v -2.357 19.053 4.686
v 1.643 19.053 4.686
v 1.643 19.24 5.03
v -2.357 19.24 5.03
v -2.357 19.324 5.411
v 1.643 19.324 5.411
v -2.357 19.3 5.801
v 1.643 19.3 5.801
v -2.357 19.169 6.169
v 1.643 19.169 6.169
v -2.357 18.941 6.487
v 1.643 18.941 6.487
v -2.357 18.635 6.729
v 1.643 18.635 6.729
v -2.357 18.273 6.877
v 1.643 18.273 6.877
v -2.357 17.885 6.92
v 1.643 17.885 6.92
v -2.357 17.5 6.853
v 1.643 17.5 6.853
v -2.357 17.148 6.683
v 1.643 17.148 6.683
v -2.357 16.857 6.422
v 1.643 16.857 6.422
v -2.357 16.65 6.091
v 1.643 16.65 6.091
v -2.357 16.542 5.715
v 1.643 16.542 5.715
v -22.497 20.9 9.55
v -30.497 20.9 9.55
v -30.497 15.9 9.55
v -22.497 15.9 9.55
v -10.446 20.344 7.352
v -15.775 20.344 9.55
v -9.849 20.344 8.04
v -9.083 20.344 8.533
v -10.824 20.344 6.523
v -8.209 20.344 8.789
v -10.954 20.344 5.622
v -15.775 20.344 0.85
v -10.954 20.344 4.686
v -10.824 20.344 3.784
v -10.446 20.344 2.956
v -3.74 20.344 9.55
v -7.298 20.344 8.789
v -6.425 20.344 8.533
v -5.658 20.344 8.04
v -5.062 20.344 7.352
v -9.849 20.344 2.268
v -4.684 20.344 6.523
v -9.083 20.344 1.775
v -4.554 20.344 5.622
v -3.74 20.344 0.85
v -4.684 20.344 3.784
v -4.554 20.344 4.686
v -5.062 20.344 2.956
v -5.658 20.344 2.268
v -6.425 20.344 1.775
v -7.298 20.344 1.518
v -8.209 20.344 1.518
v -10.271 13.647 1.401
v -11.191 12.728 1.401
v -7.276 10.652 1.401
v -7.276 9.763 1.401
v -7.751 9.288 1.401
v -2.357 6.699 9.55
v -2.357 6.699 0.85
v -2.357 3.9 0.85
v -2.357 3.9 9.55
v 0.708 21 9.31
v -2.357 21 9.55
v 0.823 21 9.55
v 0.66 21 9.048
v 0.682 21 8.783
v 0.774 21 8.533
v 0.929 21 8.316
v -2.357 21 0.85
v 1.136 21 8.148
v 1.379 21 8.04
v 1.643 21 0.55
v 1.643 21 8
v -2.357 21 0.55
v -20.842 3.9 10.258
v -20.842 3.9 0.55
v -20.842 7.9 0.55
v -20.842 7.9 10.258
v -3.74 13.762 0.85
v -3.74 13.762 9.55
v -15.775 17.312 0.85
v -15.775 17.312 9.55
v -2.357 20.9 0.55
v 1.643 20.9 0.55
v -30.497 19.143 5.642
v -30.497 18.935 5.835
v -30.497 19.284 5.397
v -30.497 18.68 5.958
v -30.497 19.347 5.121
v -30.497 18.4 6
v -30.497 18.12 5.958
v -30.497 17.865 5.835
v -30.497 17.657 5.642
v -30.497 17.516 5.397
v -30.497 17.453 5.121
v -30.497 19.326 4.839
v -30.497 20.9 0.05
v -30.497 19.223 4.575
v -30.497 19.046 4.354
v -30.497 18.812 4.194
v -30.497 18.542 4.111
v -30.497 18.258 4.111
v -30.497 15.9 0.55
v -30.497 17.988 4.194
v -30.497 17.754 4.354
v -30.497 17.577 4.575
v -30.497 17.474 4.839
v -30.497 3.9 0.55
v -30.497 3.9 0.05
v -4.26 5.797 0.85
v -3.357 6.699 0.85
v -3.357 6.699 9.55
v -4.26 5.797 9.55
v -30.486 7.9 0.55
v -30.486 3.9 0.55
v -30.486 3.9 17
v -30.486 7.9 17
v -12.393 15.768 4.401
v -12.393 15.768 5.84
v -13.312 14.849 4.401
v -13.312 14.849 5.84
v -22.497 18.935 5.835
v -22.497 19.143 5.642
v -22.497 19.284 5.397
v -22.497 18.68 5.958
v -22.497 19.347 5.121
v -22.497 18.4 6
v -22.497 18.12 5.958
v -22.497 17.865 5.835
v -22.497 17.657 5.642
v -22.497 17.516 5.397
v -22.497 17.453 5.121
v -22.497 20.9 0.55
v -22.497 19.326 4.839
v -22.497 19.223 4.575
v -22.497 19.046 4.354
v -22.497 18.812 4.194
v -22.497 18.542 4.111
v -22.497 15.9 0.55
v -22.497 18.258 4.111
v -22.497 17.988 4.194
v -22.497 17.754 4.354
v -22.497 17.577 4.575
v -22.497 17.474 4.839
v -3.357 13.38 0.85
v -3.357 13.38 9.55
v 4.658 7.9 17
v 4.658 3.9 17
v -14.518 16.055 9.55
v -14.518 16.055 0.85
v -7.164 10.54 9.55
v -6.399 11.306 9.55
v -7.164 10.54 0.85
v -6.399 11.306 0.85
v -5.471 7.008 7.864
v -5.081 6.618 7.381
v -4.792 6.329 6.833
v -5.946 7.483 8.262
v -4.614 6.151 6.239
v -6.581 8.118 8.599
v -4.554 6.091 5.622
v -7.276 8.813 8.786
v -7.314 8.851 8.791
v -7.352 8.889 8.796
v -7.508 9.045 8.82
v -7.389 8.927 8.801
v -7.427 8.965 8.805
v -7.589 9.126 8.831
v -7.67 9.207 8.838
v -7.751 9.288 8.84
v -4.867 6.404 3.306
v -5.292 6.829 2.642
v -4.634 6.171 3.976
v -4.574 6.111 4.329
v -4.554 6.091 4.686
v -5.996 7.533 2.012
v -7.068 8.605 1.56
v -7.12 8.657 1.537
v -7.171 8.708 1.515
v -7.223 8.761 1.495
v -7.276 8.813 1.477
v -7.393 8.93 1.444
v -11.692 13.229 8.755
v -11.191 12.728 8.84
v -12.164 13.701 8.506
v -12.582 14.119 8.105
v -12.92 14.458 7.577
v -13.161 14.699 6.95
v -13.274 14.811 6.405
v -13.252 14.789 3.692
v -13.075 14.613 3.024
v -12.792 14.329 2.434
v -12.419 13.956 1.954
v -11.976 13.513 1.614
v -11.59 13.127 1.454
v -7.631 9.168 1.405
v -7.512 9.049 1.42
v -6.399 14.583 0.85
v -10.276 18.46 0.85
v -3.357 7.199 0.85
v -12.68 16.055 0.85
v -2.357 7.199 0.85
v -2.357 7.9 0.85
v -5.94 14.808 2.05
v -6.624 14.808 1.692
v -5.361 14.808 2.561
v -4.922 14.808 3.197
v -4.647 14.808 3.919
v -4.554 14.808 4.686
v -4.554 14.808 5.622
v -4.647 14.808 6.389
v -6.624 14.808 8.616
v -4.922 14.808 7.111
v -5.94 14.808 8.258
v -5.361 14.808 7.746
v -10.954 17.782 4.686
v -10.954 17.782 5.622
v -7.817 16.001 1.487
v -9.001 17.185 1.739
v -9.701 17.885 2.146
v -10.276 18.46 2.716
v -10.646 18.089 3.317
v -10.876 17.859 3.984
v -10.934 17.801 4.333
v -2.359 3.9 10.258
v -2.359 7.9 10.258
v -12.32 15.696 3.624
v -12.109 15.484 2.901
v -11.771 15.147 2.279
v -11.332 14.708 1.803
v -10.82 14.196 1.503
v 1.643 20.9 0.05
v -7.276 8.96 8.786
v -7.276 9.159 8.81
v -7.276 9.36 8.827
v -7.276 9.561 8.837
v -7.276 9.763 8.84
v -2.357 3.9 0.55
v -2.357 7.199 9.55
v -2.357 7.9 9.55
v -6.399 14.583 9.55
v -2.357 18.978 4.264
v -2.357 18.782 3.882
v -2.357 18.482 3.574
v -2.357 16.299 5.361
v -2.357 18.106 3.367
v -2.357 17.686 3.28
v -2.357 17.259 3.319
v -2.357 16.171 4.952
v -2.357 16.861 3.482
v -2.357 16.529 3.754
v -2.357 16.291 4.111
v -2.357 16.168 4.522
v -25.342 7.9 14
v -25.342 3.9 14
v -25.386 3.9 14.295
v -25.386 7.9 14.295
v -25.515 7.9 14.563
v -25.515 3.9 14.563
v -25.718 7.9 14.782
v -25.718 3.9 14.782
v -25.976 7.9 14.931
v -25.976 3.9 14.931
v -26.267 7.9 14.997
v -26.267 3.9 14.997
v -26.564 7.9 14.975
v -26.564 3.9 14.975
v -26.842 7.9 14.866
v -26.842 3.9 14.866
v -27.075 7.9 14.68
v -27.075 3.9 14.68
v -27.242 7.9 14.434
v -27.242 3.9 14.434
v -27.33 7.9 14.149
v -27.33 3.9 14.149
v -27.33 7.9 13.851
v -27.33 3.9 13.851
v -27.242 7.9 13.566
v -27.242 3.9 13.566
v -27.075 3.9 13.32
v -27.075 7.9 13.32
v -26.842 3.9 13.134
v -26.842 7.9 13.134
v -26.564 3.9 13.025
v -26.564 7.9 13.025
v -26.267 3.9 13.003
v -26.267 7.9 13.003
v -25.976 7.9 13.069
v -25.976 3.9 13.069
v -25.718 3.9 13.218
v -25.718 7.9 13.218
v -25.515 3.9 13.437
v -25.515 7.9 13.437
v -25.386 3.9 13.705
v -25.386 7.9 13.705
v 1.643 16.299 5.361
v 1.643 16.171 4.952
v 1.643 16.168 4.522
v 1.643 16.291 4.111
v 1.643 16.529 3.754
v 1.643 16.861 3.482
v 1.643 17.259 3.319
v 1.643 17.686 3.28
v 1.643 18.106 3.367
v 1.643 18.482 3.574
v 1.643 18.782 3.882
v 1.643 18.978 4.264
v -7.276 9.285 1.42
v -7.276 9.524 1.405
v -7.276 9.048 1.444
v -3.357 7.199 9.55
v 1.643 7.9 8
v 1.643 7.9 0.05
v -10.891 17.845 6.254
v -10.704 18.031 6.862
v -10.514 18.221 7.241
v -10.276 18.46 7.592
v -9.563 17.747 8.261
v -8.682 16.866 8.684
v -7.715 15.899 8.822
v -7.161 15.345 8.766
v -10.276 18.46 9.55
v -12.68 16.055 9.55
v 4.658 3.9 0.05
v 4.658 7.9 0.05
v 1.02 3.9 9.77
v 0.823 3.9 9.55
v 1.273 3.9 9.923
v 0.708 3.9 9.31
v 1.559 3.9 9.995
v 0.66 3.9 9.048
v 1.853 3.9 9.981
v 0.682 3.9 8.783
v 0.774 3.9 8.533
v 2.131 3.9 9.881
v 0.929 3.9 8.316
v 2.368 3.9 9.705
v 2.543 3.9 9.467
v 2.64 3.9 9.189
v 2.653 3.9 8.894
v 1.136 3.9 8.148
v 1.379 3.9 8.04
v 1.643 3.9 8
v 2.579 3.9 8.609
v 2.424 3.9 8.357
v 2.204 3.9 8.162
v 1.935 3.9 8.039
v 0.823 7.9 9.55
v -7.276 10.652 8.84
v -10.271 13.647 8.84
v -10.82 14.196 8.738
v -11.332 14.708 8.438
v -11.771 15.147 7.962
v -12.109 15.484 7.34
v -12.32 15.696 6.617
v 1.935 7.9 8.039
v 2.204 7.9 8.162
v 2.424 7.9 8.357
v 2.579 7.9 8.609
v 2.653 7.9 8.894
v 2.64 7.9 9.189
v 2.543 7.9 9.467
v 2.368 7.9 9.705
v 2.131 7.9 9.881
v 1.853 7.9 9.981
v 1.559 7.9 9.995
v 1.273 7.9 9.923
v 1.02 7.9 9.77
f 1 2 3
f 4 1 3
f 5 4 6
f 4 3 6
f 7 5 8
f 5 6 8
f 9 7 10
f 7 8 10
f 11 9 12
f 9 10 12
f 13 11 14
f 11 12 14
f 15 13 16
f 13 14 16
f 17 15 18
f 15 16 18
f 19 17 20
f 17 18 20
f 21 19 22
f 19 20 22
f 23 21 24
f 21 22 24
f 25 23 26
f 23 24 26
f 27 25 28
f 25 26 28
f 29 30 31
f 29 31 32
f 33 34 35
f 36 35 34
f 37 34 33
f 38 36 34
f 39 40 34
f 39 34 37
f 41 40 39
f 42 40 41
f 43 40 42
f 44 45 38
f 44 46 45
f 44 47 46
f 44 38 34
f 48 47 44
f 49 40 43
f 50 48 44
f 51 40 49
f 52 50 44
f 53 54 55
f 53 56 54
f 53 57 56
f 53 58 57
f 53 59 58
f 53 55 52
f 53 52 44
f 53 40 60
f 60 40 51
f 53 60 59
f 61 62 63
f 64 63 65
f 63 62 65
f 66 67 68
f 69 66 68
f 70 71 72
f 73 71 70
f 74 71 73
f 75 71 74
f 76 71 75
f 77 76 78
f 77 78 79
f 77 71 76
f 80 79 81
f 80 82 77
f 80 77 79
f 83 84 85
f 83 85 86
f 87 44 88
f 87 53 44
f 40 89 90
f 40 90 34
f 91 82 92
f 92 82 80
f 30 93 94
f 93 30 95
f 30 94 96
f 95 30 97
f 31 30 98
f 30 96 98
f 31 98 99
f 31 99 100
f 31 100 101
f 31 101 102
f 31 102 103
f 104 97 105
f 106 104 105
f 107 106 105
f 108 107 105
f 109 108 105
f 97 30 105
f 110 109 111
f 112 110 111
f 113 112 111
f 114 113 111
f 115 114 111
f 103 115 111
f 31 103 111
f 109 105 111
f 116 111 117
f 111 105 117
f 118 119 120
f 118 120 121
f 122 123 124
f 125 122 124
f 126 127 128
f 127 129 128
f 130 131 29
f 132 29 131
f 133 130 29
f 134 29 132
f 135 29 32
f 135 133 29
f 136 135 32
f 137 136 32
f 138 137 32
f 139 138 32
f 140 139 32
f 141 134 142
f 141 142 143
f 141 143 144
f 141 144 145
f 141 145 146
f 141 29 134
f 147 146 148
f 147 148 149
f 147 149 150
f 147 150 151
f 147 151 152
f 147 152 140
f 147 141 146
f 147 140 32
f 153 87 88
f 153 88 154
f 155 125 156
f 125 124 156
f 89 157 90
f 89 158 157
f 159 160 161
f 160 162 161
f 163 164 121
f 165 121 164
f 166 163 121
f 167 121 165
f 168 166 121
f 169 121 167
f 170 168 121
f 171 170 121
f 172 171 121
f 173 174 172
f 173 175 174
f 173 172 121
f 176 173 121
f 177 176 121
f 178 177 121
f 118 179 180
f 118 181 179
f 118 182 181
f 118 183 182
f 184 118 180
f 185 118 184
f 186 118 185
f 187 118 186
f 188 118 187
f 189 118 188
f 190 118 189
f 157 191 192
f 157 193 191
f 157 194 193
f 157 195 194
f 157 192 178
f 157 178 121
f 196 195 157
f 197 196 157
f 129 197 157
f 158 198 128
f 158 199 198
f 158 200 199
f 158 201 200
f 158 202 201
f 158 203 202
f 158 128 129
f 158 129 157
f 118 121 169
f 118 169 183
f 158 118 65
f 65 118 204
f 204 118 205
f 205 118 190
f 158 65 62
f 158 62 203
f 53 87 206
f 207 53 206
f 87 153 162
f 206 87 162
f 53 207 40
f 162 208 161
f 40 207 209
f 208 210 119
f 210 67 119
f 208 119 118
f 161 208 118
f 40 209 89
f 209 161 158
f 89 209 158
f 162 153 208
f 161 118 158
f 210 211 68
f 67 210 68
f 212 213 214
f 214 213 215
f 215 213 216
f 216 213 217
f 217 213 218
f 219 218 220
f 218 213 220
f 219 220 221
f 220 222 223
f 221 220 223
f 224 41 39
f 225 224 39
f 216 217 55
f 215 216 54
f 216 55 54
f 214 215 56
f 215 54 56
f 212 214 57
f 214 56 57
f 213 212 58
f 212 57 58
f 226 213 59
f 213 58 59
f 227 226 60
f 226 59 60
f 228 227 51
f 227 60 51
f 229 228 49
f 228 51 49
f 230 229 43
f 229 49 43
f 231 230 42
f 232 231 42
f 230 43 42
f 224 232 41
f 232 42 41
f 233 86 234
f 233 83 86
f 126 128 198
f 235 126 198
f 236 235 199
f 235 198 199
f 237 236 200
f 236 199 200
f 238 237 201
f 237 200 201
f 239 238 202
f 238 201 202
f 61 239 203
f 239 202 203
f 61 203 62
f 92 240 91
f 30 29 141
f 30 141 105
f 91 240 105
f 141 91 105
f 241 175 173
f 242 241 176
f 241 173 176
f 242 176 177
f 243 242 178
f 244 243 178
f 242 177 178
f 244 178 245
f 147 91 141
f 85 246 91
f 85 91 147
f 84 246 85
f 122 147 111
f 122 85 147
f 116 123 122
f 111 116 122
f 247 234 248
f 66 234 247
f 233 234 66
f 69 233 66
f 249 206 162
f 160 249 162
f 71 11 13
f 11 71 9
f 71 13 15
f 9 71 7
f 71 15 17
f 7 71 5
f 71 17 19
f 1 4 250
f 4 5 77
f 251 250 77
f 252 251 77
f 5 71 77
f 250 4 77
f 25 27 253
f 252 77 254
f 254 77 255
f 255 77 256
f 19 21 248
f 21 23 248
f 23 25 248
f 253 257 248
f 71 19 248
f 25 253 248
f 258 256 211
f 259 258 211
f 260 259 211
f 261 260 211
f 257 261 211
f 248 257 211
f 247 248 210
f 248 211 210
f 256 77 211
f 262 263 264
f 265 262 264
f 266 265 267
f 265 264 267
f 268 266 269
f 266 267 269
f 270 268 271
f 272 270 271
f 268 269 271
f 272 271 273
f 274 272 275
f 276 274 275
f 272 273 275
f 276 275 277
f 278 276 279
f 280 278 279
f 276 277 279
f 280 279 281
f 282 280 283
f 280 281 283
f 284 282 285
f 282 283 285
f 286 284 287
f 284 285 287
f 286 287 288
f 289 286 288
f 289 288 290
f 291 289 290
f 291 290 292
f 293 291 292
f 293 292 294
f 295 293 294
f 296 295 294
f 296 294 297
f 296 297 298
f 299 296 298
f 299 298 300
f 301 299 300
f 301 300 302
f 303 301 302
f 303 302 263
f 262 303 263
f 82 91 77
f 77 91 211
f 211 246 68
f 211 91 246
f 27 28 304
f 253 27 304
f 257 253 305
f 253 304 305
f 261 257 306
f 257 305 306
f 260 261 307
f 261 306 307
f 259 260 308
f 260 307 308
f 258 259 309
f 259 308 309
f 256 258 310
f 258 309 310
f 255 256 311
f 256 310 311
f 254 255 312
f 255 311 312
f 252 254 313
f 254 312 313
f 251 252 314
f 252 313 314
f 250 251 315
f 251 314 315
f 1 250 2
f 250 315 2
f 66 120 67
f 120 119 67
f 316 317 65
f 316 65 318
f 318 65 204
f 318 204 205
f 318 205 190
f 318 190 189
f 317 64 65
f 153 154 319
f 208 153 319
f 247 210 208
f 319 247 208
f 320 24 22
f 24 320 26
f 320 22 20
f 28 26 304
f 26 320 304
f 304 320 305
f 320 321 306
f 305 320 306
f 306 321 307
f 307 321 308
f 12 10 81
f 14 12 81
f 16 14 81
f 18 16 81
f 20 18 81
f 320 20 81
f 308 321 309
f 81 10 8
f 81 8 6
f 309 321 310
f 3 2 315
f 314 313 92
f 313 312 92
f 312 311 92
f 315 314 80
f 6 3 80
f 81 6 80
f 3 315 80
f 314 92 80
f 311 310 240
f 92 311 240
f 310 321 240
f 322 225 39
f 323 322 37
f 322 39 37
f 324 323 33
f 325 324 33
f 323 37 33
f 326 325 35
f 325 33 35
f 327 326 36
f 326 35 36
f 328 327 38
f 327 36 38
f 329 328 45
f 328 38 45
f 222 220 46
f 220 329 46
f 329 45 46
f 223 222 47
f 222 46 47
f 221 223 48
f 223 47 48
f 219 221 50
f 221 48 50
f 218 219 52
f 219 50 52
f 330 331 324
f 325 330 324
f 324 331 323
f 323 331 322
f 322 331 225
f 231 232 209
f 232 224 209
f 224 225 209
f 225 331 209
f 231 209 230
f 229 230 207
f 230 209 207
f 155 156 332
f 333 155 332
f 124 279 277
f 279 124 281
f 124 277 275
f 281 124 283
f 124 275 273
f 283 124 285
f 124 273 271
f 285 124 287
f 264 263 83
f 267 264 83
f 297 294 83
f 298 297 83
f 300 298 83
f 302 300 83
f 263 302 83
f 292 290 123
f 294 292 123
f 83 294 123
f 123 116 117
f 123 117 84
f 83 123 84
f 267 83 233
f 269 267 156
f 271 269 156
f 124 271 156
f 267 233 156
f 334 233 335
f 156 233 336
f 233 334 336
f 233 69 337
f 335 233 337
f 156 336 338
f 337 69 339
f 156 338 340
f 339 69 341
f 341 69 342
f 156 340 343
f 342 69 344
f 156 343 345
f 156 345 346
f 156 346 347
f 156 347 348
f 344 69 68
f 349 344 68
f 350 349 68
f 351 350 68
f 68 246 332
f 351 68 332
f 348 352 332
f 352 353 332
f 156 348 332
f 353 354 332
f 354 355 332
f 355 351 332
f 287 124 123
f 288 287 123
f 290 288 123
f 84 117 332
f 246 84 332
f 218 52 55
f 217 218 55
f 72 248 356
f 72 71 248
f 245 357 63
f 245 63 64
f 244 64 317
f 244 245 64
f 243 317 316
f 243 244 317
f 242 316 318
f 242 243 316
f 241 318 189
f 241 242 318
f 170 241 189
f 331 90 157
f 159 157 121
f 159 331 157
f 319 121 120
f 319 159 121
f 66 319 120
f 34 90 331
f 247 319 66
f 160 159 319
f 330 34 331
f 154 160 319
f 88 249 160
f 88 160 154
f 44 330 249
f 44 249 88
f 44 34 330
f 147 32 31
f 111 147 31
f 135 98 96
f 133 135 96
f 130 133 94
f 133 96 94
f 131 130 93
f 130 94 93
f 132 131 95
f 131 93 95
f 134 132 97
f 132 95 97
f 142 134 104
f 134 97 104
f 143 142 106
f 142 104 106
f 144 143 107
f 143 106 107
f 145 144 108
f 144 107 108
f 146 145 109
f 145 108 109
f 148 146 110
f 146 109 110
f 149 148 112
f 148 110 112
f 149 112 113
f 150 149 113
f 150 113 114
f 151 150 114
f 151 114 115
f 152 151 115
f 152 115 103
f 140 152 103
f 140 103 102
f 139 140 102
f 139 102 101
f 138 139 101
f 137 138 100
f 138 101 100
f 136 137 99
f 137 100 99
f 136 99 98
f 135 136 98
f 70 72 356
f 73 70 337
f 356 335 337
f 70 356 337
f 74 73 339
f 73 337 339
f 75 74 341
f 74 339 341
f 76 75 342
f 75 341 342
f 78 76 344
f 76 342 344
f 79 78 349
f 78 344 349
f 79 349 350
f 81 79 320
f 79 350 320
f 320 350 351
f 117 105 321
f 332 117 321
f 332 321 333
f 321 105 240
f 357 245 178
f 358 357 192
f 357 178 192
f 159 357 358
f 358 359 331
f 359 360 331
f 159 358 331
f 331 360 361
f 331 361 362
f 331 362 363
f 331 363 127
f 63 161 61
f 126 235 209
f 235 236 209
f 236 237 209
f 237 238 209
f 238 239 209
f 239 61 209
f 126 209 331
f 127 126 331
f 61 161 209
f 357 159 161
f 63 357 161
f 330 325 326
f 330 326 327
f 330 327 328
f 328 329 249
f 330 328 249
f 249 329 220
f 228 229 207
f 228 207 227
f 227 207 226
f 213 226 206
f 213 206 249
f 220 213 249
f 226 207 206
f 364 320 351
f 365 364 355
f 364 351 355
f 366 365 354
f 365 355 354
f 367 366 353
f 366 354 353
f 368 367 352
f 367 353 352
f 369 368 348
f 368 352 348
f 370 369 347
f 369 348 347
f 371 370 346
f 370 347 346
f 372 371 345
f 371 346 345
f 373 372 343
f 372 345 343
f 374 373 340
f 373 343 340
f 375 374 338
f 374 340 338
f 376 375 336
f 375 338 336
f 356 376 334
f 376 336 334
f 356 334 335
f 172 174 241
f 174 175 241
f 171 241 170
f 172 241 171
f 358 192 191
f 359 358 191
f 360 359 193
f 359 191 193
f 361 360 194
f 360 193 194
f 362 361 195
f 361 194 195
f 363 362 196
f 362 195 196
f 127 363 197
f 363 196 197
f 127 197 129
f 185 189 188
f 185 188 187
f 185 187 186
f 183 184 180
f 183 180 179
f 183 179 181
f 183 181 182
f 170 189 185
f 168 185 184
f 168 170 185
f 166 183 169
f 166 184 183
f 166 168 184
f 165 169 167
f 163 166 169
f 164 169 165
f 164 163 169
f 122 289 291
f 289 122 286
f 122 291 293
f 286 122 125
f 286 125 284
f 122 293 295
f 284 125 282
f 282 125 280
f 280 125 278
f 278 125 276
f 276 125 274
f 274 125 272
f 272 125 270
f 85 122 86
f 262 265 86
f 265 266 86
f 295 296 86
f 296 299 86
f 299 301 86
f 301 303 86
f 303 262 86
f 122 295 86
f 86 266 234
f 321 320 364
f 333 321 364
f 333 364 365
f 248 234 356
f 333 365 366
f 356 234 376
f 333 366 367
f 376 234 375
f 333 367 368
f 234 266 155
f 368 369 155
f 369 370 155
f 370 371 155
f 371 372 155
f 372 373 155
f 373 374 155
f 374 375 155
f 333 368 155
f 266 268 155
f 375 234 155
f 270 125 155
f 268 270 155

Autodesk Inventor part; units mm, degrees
ref_plane "YZ Plane" through (0, 0, 0) normal (1, 0, 0) x (0, 1, 0)
ref_plane "XZ Plane" through (0, 0, 0) normal (0, 1, 0) x (-1, 0, 0)
ref_plane "Work Plane1" through (-9.4272, 11.5884, 0.05) normal (0, 0, 1) x (1, 0, 0)
sketch "Sketch1" plane through (-9.4272, 11.5884, 0.05) normal (0, 0, 1) x (1, 0, 0)
  line L0 (-5.9698, 7.5884) -> (-5.9698, -7.5884) projected
  line L1 (-5.9698, -7.5884) -> (5.9698, -7.5884) projected
  line L2 (5.9698, -7.5884) -> (5.9698, 7.5884) projected
  line L3 (5.9698, 7.5884) -> (-5.9698, 7.5884) projected
  line L4 (-6.0698, 7.6884) -> (-6.0698, -7.6884)
  line L5 (-6.0698, -7.6884) -> (6.0698, -7.6884)
  line L6 (6.0698, -7.6884) -> (6.0698, 7.6884)
  line L7 (6.0698, 7.6884) -> (-6.0698, 7.6884)
  line L8 (-6.0698, -7.6884) -> (-21.0698, -7.6884)
  line L9 (-21.0698, -7.6884) -> (-21.0698, 9.3116)
  line L10 (6.0698, -7.6884) -> (11.0698, -7.6884)
  line L11 (11.0698, -7.6884) -> (11.0698, 9.3116)
  line L12 (11.0698, 9.3116) -> (-21.0698, 9.3116)
  point P0 (9.4272, -11.5884)
  dimension "d0" = 0.1
  dimension "d1" = 15
  dimension "d2" = 17
  dimension "d3" = 5
  dimension "d4" = 90
extrude "Extrusion1" add sketch "Sketch1" along normal blind 0.5 contours L3 L2 L1 L0 | L7 L6 L5 L4 | L4 L8 L9 L12 L11 L10 L6 L7
sketch "Sketch3" plane through (-9.4272, 11.5884, 0.55) normal (0, 0, 1) x (1, 0, 0)
  line L0 (-2.9698, 4.4671) -> (-0.8485, 6.5884) projected
  line L1 (2.2627, -0.7655) -> (-2.9698, 4.4671) projected
  line L2 (2.8284, -0.1998) -> (2.2627, -0.7655) projected
  line L3 (2.8284, 2.9115) -> (2.8284, -0.1998) projected
  line L4 (-0.8485, 6.5884) -> (2.8284, 2.9115) projected
  line L5 (5.6875, 2.1737) -> (6.0698, 1.7914)
  line L6 (6.0698, 1.7914) -> (6.0698, -4.8892)
  line L7 (6.0698, 7.6884) -> (6.0698, -7.5884) projected
  line L8 (6.0698, -4.8892) -> (5.1675, -5.7915)
  line L9 (5.1675, -5.7915) -> (-5.0912, 4.4671)
  line L10 (3.0284, 2.9943) -> (3.0284, -0.2826)
  line L11 (3.0284, -0.2826) -> (2.2627, -1.0483)
  line L12 (2.2627, -1.0483) -> (-3.2527, 4.4671)
  line L13 (-3.2527, 4.4671) -> (-0.8485, 6.8713)
  line L14 (-0.8485, 6.8713) -> (3.0284, 2.9943)
  line L15 (6.0698, -4.8892) -> (7.0698, -4.8892)
  line L16 (7.0698, -4.8892) -> (7.0698, -4.3892)
  line L17 (7.0698, -4.3892) -> (6.0698, -4.3892)
  line L18 (6.0698, -4.3892) -> (6.0698, -4.8892)
  line L19 (-11.0698, 9.4116) -> (11.0698, 9.4116) projected
  line L20 (-21.0698, -7.6884) -> (11.0698, -7.6884) projected
  line L21 (11.0698, 9.4116) -> (7.0698, 9.4116)
  line L22 (7.0698, 9.4116) -> (7.0698, -7.6884)
  line L23 (7.0698, -7.6884) -> (11.0698, -7.6884)
  line L24 (11.0698, -7.6884) -> (11.0698, 9.4116)
  line L25 (-5.0912, 4.4671) -> (-6.3481, 5.724)
  line L26 (-6.3481, 8.7553) -> (-0.8485, 8.7553)
  line L27 (-0.8485, 8.7553) -> (5.6875, 8.7553)
  line L28 (5.6875, 8.7553) -> (5.6875, 2.1737)
  line L29 (-5.0912, 4.4671) -> (-4.0305, 5.5278)
  line L30 (-1.9092, 7.6491) -> (-1.7678, 7.7905)
  line L31 (-6.3481, 5.724) -> (-6.3481, 5.724)
  line L32 (-6.3481, 5.724) -> (-6.3481, 8.7553)
  point P0 (9.4272, -11.5884)
  point P1 (11.0698, -7.6884)
  dimension "d10" = 1.5
  dimension "d11" = 1.5
  dimension "d14" = 0.2
  dimension "d15" = 1
  dimension "d16" = 0.5
extrude "Extrusion3" add sketch "Sketch3" along normal blind 9 contours L5 L6 L8 L9 L25 L32 L26 L27 L28 | L17 L16 L15 L6 | L22 L19 L24 L20 L16
sketch "Sketch4" plane through (-30.497, 3.9, 0.55) normal (0, -1, 0) x (1, 0, 0)
  line L0 (26.2373, 0) -> (14.7218, 0) projected
  line L1 (26.2373, 0) -> (26.2373, 9) projected
  line L2 (14.7218, 9) -> (26.2373, 9) projected
  line L3 (28.1397, 0) -> (0, 0) projected
  line L4 (0, 0) -> (28.1397, 0)
  line L5 (28.1397, 0) -> (28.1397, 0.3)
  line L6 (28.1397, 0.3) -> (0, 0.3)
  line L7 (0, 0.3) -> (0, 0)
  line L8 (14.7218, 0) -> (14.7218, 9) projected
  point P0 (30.497, -0.55)
  point P1 (1.736, 0)
  point P2 (18.1397, 0)
  dimension "d41" = 0.3
extrude "Extrusion4" cut sketch "Sketch4" against normal through all contours L0 L8 L6 L1 | L1 L6 L5 L3 | L3 L7 L6 L8
ref_plane "Work Plane3" through (1.6427, 4, -2.95) normal (1, 0, 0) x (0, 0, -1)
sketch "Sketch5" plane through (1.6427, 4, -2.95) normal (1, 0, 0) x (0, 0, -1)
  line L0 (-3, 16.9) -> (-3.5, 16.9) projected
  line L1 (-12.5, -0.1) -> (-12.5, 17) projected
  line L2 (-3, -0.1) -> (-12.5, -0.1) projected
  circle A0 centre (-8.4703, 13.9285) radius 1.4
  line L3 (-3, 16.9) -> (-3, -0.1) projected
  line L4 (-3.5, 17) -> (-3.5, 16.9) projected
  line L5 (-3.5, 17) -> (-12.5, 17) projected
  point P0 (-2.95, -4)
  dimension "d21" = 2.8
extrude "Extrusion5" cut sketch "Sketch5" against normal up to surface (5.3823 mm away) contours A0
sketch "Sketch6" plane through (-15.7753, 20.3438, 9.55) normal (0, 1, 0) x (1, 0, 0)
  circle A0 centre (8.0214, 3.9282) radius 3.2
  line L0 (8.0214, 3.9282) -> (8.0214, 4.8641) construction
  line L1 (11.2214, 3.9282) -> (11.2214, 4.8641)
  line L2 (4.8214, 4.8641) -> (4.8214, 3.9282)
  arc A1 (4.8214, 3.9282) -> (11.2214, 3.9282) centre (8.0214, 3.9282) ccw
  arc A2 (11.2214, 4.8641) -> (4.8214, 4.8641) centre (8.0214, 4.8641) ccw
  point P0 (15.7753, 9.55)
  point P1 (8.0214, 4.3961)
extrude "Extrusion6" cut sketch "Sketch6" against normal through all
sketch "Sketch7" plane through (-30.497, 3.9, 0.55) normal (-1, 0, 0) x (0, 0, 1)
  circle A0 centre (4.4299, 8.2054) radius 3.6733
  point P0 (-0.55, -3.9)
  point P1 (5.45, 8.2054)
ref_plane "Work Plane2" through (-9.7807, 13.4392, 0.05) normal (-0.7071, -0.7071, 0) x (0, 0, 1)
sketch "Sketch8" plane through (-4.2597, 5.7969, 9.55) normal (-0.7071, -0.7071, 0) x (-0.7071, 0.7071, 0)
  line L0 (16.2855, 8.7) -> (0, 8.7) projected
  line L1 (0, 8.7) -> (0, 0) projected
  line L2 (16.2855, 0) -> (0, 0) projected
  ellipse E0 centre (4.9415, 3.9282) end of major axis (9.4669, 3.9282) minor radius 3.2 (0.416, 3.9282) -> (9.4669, 3.9282) ccw projected
  ellipse E1 centre (4.9415, 4.8641) end of major axis (0.416, 4.8641) minor radius 3.2 (9.4669, 4.8641) -> (0.416, 4.8641) ccw projected
  line L3 (4.9374, 0.7098) -> (9.8018, 0.7098)
  line L4 (12.8018, 3.7098) -> (12.8018, 5.1494)
  line L5 (9.8018, 8.1494) -> (4.9374, 8.1494)
  line L6 (1.9374, 5.1494) -> (1.9374, 3.7098)
  arc A0 (9.8018, 0.7098) -> (12.8018, 3.7098) centre (9.8018, 3.7098) ccw
  arc A1 (12.8018, 5.1494) -> (9.8018, 8.1494) centre (9.8018, 5.1494) ccw
  arc A2 (4.9374, 8.1494) -> (1.9374, 5.1494) centre (4.9374, 5.1494) ccw
  arc A3 (1.9374, 3.7098) -> (4.9374, 0.7098) centre (4.9374, 3.7098) ccw
  line L7 (9.4669, 4.8641) -> (9.4669, 3.9282) projected
  line L8 (16.2855, 8.7) -> (16.2855, 0) projected
  line L9 (0.416, 3.9282) -> (0.416, 4.8641) projected
  point P0 (-7.1111, 9.55)
  dimension "d42" = 3
extrude "Extrusion8" cut sketch "Sketch8" against normal up to surface (1.3 mm away) contours A3 L6 A2 E1 L7 E0 | E0 L7 E1 A2 L5 A1 L4 A0 L3 A3
ref_plane "Work Plane4" through (-9.4272, 11.5884, -2.95) normal (0, 0, -1) x (-1, 0, 0)
ref_plane "Work Plane7" through (-6.3987, 11.3058, 7.8996) normal (0, 1, 0) x (1, 0, 0)
ref_plane "Work Plane5" through (-3.3573, 3.9, 0.05) normal (0, -1, 0) x (1, 0, 0)
sketch "Sketch16" plane through (-3.3573, 3.9, 0.05) normal (0, -1, 0) x (1, 0, 0)
  line L0 (1, 0.5) -> (1, 9.5) projected
  line L1 (-27.1397, 0.5) -> (1, 0.5) projected
  line L2 (5, 0) -> (-27.1397, 0) projected
  line L3 (5, 0) -> (5, 9.5) projected
  line L4 (1, 9.5) -> (5, 9.5) projected
  line L5 (5, 0) -> (-27.1397, 0) projected
  line L6 (-12.1397, 0.5) -> (0, 0.5) projected
  line L7 (5, 0) -> (-27.1397, 0) projected
  line L8 (-27.1397, 0.5) -> (1, 0.5) projected
  line L9 (-27.1397, 0) -> (-27.1397, 0.5) projected
  line L10 (-12.1397, 0) -> (-12.1397, 0.5) projected
  circle A0 centre (5.0158, 8.95) radius 1 projected
  circle A1 centre (-16.4842, -6.55) radius 1 projected
  circle A2 centre (-22.9842, 13.95) radius 1 projected
  line L11 (-27.1287, 16.95) -> (8.0158, 16.95)
  line L12 (8.0158, 16.95) -> (8.0158, 0)
  line L13 (8.0158, 0) -> (-27.1287, 0)
  line L14 (-27.1287, 0) -> (-27.1287, 16.95)
  circle A3 centre (-22.9842, 13.95) radius 1
  circle A4 centre (5.0158, 8.95) radius 1
  line L15 (0.9985, 0.5) -> (-17.4842, 0.5)
  line L16 (-17.4842, 0.5) -> (-17.4842, 10.2078)
  line L17 (-17.4842, 10.2078) -> (0.9985, 10.2078)
  line L18 (0.9985, 10.2078) -> (0.9985, 0.5)
  line L19 (-27.1397, 0) -> (-27.1397, 0.5) projected
  point P0 (3.3573, -0.05)
  point P1 (0, 0)
  dimension "d53" = 3
  dimension "d54" = 3
  dimension "d55" = 2
  dimension "d56" = 2
extrude "Extrusion15" add sketch "Sketch16" against normal blind 4 contours L0 L4 A0 L3 L2 L10 L1 | L18 L17 L16 L1 L14 L11 L12 L13 L3 A0 L4 | L4 L3 A0 | L10 L2 L14 L1 | L14 L2 L9 L1 picked at (4.9217, 8.4773)
ref_plane "Work Plane6" through (-29.3415, 3.9, 17) normal (0, -1, 0) x (1, 0, 0)
sketch "Sketch17" plane through (-29.3415, 3.9, 17) normal (0, -1, 0) x (1, 0, 0)
  arc A0 (30.9842, -8.9999) -> (30.1648, -7.45) centre (31, -8) ccw projected
  circle A1 centre (31, -8) radius 1
  point P0 (29.3415, -17)
extrude "Extrusion16" cut sketch "Sketch17" against normal through all
sketch "Sketch18" plane through (1.6427, 20.9, 0.55) normal (1, 0, 0) x (0, 0, -1)
  line L0 (0.5, 0) -> (0.5, -13) projected
  line L1 (0.5, 0) -> (0, 0) projected
  line L2 (0, 0.1) -> (0, 0) projected
  line L3 (0, 0.1) -> (-7.4501, 0.1) projected
  line L4 (-9, -7.1378) -> (-9, -0.5562) projected
  line L5 (-0.3, -7.1378) -> (-9, -7.1378) projected
  circle A0 centre (-4.1776, -3.2963) radius 1.45
  line L6 (-0.3, -0.5562) -> (-9, -0.5562) projected
  line L7 (-7.4501, 0.1) -> (-7.4501, -13) projected
  line L8 (-7.4501, -13) -> (0.5, -13) projected
  line L9 (-0.3, -7.1378) -> (-0.3, -0.5562) projected
  point P0 (0.55, -20.9)
  dimension "d61" = 2.9
extrude "Extrusion17" cut sketch "Sketch18" against normal up to surface (5.3823 mm away) contours A0
sketch "Sketch19" plane through (-9.4272, 11.5884, 9.55) normal (0, 0, 1) x (1, 0, 0)
  line L0 (7.0684, -4.8892) -> (7.0684, -4.3892) projected
  line L1 (7.0684, -4.3892) -> (6.0698, -4.3892) projected
  line L2 (6.0698, -4.3892) -> (6.0698, 1.7914) projected
  line L3 (6.0698, 1.7914) -> (5.6875, 2.1737) projected
  line L4 (5.6875, 2.1737) -> (5.6875, 8.7553) projected
  line L5 (5.6875, 8.7553) -> (-6.3481, 8.7553) projected
  line L6 (-6.3481, 8.7553) -> (-6.3481, 5.724) projected
  line L7 (-6.3481, 5.724) -> (5.1675, -5.7915) projected
  line L8 (5.1675, -5.7915) -> (6.0698, -4.8892) projected
  line L9 (6.0698, -4.8892) -> (7.0684, -4.8892) projected
  line L10 (3.0284, -0.2826) -> (2.2627, -1.0483) projected
  line L11 (2.2627, -1.0483) -> (-3.2527, 4.4671) projected
  line L12 (-3.2527, 4.4671) -> (-0.8485, 6.8713) projected
  line L13 (-0.8485, 6.8713) -> (3.0284, 2.9943) projected
  line L14 (3.0284, 2.9943) -> (3.0284, -0.2826) projected
  line L15 (2.2627, -1.0483) -> (-3.2527, 4.4671) projected
  line L16 (2.1513, -0.9369) -> (2.1513, -2.7754)
  line L17 (-6.3481, 5.724) -> (5.1675, -5.7915) projected
  line L18 (5.6875, 2.1737) -> (5.6875, 8.7553) projected
  line L19 (2.1513, -2.7754) -> (6.0698, -2.7754)
  line L20 (2.8027, 3.22) -> (5.6875, 3.22)
  point P0 (9.4272, -11.5884)
extrude "Extrusion18" add sketch "Sketch19" against normal up to surface (8.7 mm away) contours L9 L8 L7 L19 L2 L1 L0 | L19 L16 L11 L10 L14 L13 L20 L4 L3 L2
sketch "Sketch20" plane through (-9.4272, 11.5884, 0.55) normal (0, 0, 1) x (1, 0, 0)
  line L0 (7.0684, -7.6884) -> (7.0684, -3.6884) projected
  line L1 (7.0684, -3.6884) -> (7.0698, -3.6884) projected
  line L2 (7.0698, -3.6884) -> (7.0698, 9.3116) projected
  line L3 (7.0698, 9.3116) -> (-21.0698, 9.3116) projected
  line L4 (-21.0698, 9.3116) -> (-21.0698, -7.6884) projected
  line L5 (-21.0698, -7.6884) -> (-21.0589, -7.6884) projected
  line L6 (-21.0589, -7.6884) -> (-21.0589, -3.6884) projected
  line L7 (-21.0589, -3.6884) -> (-11.4143, -3.6884) projected
  line L8 (-11.4143, -3.6884) -> (-11.4143, -7.6884) projected
  line L9 (-11.4143, -7.6884) -> (7.0684, -7.6884) projected
  line L10 (-21.0698, 9.3116) -> (-13.0698, 9.3116)
  line L11 (-13.0698, 9.3116) -> (-13.0698, 4.3116)
  line L12 (-13.0698, 4.3116) -> (-21.0698, 4.3116)
  line L13 (-21.0698, 4.3116) -> (-21.0698, 9.3116)
  point P0 (9.4272, -11.5884)
  dimension "d66" = 8
  dimension "d67" = 5
extrude "Extrusion19" add sketch "Sketch20" along normal up to surface (9 mm away) contours L11 L12 L4 L3
sketch "Sketch21" plane through (-30.497, 3.9, 0.05) normal (-1, 0, 0) x (0, 0, 1)
  line L0 (0, 17) -> (9.5, 17) projected
  line L1 (0, 0) -> (0, 17) projected
  line L2 (0, 0) -> (0.5, 0) projected
  line L3 (0.5, 12) -> (0.5, 0) projected
  line L4 (0.5, 12) -> (9.5, 12) projected
  line L5 (9.5, 12) -> (9.5, 17) projected
  circle A0 centre (5, 14.5) radius 0.95
  point P0 (-0.05, -3.9)
  dimension "d70" = 1.9
extrude "Extrusion20" cut sketch "Sketch21" against normal up to surface (8 mm away) contours A0
properties part number "cellSTORM_dichroic_mirror_adjuster_tmp"
